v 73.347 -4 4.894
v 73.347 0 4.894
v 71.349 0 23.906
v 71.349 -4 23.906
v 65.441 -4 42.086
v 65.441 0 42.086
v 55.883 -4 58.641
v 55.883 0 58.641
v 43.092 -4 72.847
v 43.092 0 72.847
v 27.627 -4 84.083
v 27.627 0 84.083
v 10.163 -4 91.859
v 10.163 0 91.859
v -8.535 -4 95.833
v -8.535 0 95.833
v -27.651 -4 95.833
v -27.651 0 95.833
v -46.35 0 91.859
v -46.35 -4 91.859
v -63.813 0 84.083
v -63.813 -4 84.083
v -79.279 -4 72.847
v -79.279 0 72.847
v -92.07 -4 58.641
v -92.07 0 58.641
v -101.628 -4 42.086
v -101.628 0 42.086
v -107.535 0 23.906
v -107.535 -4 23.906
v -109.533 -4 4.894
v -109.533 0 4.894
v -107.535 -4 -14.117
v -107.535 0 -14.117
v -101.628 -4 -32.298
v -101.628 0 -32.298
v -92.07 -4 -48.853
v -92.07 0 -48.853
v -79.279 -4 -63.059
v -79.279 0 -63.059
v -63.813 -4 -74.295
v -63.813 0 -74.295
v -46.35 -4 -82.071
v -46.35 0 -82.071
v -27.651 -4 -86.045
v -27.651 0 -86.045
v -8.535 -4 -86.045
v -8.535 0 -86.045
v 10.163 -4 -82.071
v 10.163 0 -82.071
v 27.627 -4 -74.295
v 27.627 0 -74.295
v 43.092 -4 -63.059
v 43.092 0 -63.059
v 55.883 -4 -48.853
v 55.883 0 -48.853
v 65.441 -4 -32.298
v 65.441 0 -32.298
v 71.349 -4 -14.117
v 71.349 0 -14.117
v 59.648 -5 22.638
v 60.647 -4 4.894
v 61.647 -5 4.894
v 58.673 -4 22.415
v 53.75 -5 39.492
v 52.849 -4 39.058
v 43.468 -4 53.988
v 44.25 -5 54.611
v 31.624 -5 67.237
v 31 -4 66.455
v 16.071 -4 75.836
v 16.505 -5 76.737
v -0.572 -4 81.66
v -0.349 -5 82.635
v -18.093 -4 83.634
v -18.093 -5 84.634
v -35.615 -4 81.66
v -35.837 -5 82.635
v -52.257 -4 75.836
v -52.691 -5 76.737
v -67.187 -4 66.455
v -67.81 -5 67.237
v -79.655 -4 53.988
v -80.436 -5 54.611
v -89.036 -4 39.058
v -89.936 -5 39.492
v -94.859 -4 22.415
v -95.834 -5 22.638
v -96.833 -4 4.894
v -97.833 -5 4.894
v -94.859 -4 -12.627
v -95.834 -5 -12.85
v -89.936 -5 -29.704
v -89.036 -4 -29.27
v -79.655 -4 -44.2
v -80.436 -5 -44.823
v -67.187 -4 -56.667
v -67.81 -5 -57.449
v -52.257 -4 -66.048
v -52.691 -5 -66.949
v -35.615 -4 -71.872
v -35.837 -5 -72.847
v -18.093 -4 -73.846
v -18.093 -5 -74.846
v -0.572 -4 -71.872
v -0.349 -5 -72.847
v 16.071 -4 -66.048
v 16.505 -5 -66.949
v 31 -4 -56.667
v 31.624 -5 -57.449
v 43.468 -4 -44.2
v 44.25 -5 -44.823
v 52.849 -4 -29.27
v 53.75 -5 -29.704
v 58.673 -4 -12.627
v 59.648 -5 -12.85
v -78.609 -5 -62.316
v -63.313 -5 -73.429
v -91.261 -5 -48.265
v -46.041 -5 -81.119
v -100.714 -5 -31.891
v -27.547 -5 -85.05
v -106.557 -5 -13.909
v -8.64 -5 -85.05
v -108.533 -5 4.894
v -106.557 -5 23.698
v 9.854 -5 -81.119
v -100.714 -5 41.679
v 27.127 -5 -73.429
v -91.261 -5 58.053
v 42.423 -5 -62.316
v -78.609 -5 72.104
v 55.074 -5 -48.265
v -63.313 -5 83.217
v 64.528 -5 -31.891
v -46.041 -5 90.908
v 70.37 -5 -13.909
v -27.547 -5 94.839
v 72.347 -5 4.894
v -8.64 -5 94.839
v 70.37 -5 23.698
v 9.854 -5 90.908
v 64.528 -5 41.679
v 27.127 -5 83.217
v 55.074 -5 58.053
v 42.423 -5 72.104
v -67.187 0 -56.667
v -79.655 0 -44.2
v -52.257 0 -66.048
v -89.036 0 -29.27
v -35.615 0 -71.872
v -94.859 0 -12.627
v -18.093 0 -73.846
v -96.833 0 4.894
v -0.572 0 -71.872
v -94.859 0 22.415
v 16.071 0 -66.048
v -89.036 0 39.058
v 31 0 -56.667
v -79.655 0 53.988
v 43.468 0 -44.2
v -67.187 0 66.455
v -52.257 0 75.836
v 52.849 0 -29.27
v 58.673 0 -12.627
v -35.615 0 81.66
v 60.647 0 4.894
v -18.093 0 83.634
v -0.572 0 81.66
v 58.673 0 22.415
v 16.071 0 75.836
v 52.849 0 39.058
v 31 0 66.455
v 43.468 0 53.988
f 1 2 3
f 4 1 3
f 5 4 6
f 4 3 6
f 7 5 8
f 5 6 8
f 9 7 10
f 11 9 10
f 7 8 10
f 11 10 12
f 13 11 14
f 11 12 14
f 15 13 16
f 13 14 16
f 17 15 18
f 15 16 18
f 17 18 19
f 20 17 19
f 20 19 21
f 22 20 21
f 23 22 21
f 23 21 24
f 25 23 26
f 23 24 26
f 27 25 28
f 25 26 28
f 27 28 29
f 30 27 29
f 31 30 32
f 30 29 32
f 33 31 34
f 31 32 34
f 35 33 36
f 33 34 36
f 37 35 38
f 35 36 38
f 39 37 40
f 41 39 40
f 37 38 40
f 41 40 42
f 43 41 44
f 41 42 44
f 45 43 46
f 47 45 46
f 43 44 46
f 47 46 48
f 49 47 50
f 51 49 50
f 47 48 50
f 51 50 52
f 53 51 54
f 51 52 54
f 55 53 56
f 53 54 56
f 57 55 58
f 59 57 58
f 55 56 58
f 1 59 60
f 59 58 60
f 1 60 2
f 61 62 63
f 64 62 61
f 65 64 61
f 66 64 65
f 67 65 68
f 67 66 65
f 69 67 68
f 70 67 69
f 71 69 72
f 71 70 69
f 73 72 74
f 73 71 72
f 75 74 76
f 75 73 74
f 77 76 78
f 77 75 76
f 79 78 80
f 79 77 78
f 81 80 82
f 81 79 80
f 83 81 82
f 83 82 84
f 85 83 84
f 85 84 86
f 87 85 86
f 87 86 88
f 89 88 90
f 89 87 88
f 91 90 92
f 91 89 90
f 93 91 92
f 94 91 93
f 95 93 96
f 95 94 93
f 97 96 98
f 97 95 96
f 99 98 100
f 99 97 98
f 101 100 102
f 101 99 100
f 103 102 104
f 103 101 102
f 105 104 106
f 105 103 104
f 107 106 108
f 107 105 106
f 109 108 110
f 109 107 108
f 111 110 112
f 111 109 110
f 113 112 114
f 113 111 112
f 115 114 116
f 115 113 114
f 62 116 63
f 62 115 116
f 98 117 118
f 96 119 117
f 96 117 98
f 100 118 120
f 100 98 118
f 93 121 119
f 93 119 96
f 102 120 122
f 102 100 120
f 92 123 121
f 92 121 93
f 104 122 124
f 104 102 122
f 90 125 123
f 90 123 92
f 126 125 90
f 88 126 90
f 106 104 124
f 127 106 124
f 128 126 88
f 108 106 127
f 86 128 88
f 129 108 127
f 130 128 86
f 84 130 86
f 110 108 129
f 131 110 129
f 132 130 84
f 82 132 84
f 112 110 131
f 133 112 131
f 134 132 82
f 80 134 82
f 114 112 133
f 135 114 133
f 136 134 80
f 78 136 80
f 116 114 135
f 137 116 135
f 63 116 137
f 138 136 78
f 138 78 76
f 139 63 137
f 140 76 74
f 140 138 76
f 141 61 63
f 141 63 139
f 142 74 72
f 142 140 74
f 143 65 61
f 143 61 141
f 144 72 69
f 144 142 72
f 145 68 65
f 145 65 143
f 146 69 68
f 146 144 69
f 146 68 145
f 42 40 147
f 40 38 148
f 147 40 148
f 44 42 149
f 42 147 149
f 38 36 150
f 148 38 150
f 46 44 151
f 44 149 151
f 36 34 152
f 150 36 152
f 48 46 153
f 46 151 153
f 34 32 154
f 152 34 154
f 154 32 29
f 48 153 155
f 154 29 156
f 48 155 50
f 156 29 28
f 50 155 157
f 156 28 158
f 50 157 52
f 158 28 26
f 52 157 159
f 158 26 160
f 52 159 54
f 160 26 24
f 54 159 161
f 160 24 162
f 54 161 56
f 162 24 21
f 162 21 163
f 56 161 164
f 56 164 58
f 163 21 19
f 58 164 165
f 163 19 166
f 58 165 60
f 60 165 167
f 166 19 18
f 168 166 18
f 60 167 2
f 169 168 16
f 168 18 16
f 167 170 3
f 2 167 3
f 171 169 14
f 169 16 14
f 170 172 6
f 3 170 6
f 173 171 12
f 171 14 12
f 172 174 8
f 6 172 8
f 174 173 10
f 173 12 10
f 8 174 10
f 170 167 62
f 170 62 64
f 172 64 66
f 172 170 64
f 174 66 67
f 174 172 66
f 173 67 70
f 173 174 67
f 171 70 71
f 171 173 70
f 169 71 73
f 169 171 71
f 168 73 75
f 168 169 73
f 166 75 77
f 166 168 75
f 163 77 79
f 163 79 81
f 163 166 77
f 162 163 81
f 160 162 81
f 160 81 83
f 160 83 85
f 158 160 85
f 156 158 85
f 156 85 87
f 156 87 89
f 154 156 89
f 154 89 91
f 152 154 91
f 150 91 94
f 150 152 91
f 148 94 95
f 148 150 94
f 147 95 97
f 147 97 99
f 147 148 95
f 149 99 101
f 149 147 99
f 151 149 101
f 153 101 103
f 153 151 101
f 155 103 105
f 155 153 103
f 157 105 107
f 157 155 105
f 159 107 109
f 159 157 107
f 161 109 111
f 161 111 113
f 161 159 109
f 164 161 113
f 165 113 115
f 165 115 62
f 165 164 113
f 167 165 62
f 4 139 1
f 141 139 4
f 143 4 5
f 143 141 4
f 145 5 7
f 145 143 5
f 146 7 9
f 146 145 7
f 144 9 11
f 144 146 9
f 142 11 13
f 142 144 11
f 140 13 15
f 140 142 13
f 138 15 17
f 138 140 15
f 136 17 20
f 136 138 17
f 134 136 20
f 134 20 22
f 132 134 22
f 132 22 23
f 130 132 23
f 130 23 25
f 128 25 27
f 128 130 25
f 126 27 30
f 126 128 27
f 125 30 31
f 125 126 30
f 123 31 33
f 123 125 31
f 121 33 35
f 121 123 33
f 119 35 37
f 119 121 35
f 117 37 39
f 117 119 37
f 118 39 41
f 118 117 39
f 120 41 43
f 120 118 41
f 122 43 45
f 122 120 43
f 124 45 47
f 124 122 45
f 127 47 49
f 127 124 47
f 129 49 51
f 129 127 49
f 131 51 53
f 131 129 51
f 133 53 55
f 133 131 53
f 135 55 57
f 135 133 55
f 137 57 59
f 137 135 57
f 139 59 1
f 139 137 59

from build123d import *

# Parameters (mm, degrees)
F0_R     = 91.44
F0_R_2   = 78.74
F1_DEPTH = 5
F2_SIZE  = 1
F3_SIZE  = 1


with BuildPart() as f1:
    # F0 (on Front) → F1 (new body)
    with BuildSketch(Plane.XZ):
        with Locations((-18.093221, 4.894068)):
            Circle(F0_R)
        with Locations((-18.093221, 4.894068)):
            Circle(F0_R_2, mode=Mode.SUBTRACT)
    extrude(amount=F1_DEPTH)

    # F2
    f2_edges = [f1.edges().sort_by_distance(p)[0] for p in [
        (-109.533221, -5, 4.894068),
    ]]
    chamfer(f2_edges, length=F2_SIZE)

    # F3
    f3_edges = [f1.edges().sort_by_distance(p)[0] for p in [
        (-96.833221, -5, 4.894068),
    ]]
    chamfer(f3_edges, length=F3_SIZE)


solid = f1.part
